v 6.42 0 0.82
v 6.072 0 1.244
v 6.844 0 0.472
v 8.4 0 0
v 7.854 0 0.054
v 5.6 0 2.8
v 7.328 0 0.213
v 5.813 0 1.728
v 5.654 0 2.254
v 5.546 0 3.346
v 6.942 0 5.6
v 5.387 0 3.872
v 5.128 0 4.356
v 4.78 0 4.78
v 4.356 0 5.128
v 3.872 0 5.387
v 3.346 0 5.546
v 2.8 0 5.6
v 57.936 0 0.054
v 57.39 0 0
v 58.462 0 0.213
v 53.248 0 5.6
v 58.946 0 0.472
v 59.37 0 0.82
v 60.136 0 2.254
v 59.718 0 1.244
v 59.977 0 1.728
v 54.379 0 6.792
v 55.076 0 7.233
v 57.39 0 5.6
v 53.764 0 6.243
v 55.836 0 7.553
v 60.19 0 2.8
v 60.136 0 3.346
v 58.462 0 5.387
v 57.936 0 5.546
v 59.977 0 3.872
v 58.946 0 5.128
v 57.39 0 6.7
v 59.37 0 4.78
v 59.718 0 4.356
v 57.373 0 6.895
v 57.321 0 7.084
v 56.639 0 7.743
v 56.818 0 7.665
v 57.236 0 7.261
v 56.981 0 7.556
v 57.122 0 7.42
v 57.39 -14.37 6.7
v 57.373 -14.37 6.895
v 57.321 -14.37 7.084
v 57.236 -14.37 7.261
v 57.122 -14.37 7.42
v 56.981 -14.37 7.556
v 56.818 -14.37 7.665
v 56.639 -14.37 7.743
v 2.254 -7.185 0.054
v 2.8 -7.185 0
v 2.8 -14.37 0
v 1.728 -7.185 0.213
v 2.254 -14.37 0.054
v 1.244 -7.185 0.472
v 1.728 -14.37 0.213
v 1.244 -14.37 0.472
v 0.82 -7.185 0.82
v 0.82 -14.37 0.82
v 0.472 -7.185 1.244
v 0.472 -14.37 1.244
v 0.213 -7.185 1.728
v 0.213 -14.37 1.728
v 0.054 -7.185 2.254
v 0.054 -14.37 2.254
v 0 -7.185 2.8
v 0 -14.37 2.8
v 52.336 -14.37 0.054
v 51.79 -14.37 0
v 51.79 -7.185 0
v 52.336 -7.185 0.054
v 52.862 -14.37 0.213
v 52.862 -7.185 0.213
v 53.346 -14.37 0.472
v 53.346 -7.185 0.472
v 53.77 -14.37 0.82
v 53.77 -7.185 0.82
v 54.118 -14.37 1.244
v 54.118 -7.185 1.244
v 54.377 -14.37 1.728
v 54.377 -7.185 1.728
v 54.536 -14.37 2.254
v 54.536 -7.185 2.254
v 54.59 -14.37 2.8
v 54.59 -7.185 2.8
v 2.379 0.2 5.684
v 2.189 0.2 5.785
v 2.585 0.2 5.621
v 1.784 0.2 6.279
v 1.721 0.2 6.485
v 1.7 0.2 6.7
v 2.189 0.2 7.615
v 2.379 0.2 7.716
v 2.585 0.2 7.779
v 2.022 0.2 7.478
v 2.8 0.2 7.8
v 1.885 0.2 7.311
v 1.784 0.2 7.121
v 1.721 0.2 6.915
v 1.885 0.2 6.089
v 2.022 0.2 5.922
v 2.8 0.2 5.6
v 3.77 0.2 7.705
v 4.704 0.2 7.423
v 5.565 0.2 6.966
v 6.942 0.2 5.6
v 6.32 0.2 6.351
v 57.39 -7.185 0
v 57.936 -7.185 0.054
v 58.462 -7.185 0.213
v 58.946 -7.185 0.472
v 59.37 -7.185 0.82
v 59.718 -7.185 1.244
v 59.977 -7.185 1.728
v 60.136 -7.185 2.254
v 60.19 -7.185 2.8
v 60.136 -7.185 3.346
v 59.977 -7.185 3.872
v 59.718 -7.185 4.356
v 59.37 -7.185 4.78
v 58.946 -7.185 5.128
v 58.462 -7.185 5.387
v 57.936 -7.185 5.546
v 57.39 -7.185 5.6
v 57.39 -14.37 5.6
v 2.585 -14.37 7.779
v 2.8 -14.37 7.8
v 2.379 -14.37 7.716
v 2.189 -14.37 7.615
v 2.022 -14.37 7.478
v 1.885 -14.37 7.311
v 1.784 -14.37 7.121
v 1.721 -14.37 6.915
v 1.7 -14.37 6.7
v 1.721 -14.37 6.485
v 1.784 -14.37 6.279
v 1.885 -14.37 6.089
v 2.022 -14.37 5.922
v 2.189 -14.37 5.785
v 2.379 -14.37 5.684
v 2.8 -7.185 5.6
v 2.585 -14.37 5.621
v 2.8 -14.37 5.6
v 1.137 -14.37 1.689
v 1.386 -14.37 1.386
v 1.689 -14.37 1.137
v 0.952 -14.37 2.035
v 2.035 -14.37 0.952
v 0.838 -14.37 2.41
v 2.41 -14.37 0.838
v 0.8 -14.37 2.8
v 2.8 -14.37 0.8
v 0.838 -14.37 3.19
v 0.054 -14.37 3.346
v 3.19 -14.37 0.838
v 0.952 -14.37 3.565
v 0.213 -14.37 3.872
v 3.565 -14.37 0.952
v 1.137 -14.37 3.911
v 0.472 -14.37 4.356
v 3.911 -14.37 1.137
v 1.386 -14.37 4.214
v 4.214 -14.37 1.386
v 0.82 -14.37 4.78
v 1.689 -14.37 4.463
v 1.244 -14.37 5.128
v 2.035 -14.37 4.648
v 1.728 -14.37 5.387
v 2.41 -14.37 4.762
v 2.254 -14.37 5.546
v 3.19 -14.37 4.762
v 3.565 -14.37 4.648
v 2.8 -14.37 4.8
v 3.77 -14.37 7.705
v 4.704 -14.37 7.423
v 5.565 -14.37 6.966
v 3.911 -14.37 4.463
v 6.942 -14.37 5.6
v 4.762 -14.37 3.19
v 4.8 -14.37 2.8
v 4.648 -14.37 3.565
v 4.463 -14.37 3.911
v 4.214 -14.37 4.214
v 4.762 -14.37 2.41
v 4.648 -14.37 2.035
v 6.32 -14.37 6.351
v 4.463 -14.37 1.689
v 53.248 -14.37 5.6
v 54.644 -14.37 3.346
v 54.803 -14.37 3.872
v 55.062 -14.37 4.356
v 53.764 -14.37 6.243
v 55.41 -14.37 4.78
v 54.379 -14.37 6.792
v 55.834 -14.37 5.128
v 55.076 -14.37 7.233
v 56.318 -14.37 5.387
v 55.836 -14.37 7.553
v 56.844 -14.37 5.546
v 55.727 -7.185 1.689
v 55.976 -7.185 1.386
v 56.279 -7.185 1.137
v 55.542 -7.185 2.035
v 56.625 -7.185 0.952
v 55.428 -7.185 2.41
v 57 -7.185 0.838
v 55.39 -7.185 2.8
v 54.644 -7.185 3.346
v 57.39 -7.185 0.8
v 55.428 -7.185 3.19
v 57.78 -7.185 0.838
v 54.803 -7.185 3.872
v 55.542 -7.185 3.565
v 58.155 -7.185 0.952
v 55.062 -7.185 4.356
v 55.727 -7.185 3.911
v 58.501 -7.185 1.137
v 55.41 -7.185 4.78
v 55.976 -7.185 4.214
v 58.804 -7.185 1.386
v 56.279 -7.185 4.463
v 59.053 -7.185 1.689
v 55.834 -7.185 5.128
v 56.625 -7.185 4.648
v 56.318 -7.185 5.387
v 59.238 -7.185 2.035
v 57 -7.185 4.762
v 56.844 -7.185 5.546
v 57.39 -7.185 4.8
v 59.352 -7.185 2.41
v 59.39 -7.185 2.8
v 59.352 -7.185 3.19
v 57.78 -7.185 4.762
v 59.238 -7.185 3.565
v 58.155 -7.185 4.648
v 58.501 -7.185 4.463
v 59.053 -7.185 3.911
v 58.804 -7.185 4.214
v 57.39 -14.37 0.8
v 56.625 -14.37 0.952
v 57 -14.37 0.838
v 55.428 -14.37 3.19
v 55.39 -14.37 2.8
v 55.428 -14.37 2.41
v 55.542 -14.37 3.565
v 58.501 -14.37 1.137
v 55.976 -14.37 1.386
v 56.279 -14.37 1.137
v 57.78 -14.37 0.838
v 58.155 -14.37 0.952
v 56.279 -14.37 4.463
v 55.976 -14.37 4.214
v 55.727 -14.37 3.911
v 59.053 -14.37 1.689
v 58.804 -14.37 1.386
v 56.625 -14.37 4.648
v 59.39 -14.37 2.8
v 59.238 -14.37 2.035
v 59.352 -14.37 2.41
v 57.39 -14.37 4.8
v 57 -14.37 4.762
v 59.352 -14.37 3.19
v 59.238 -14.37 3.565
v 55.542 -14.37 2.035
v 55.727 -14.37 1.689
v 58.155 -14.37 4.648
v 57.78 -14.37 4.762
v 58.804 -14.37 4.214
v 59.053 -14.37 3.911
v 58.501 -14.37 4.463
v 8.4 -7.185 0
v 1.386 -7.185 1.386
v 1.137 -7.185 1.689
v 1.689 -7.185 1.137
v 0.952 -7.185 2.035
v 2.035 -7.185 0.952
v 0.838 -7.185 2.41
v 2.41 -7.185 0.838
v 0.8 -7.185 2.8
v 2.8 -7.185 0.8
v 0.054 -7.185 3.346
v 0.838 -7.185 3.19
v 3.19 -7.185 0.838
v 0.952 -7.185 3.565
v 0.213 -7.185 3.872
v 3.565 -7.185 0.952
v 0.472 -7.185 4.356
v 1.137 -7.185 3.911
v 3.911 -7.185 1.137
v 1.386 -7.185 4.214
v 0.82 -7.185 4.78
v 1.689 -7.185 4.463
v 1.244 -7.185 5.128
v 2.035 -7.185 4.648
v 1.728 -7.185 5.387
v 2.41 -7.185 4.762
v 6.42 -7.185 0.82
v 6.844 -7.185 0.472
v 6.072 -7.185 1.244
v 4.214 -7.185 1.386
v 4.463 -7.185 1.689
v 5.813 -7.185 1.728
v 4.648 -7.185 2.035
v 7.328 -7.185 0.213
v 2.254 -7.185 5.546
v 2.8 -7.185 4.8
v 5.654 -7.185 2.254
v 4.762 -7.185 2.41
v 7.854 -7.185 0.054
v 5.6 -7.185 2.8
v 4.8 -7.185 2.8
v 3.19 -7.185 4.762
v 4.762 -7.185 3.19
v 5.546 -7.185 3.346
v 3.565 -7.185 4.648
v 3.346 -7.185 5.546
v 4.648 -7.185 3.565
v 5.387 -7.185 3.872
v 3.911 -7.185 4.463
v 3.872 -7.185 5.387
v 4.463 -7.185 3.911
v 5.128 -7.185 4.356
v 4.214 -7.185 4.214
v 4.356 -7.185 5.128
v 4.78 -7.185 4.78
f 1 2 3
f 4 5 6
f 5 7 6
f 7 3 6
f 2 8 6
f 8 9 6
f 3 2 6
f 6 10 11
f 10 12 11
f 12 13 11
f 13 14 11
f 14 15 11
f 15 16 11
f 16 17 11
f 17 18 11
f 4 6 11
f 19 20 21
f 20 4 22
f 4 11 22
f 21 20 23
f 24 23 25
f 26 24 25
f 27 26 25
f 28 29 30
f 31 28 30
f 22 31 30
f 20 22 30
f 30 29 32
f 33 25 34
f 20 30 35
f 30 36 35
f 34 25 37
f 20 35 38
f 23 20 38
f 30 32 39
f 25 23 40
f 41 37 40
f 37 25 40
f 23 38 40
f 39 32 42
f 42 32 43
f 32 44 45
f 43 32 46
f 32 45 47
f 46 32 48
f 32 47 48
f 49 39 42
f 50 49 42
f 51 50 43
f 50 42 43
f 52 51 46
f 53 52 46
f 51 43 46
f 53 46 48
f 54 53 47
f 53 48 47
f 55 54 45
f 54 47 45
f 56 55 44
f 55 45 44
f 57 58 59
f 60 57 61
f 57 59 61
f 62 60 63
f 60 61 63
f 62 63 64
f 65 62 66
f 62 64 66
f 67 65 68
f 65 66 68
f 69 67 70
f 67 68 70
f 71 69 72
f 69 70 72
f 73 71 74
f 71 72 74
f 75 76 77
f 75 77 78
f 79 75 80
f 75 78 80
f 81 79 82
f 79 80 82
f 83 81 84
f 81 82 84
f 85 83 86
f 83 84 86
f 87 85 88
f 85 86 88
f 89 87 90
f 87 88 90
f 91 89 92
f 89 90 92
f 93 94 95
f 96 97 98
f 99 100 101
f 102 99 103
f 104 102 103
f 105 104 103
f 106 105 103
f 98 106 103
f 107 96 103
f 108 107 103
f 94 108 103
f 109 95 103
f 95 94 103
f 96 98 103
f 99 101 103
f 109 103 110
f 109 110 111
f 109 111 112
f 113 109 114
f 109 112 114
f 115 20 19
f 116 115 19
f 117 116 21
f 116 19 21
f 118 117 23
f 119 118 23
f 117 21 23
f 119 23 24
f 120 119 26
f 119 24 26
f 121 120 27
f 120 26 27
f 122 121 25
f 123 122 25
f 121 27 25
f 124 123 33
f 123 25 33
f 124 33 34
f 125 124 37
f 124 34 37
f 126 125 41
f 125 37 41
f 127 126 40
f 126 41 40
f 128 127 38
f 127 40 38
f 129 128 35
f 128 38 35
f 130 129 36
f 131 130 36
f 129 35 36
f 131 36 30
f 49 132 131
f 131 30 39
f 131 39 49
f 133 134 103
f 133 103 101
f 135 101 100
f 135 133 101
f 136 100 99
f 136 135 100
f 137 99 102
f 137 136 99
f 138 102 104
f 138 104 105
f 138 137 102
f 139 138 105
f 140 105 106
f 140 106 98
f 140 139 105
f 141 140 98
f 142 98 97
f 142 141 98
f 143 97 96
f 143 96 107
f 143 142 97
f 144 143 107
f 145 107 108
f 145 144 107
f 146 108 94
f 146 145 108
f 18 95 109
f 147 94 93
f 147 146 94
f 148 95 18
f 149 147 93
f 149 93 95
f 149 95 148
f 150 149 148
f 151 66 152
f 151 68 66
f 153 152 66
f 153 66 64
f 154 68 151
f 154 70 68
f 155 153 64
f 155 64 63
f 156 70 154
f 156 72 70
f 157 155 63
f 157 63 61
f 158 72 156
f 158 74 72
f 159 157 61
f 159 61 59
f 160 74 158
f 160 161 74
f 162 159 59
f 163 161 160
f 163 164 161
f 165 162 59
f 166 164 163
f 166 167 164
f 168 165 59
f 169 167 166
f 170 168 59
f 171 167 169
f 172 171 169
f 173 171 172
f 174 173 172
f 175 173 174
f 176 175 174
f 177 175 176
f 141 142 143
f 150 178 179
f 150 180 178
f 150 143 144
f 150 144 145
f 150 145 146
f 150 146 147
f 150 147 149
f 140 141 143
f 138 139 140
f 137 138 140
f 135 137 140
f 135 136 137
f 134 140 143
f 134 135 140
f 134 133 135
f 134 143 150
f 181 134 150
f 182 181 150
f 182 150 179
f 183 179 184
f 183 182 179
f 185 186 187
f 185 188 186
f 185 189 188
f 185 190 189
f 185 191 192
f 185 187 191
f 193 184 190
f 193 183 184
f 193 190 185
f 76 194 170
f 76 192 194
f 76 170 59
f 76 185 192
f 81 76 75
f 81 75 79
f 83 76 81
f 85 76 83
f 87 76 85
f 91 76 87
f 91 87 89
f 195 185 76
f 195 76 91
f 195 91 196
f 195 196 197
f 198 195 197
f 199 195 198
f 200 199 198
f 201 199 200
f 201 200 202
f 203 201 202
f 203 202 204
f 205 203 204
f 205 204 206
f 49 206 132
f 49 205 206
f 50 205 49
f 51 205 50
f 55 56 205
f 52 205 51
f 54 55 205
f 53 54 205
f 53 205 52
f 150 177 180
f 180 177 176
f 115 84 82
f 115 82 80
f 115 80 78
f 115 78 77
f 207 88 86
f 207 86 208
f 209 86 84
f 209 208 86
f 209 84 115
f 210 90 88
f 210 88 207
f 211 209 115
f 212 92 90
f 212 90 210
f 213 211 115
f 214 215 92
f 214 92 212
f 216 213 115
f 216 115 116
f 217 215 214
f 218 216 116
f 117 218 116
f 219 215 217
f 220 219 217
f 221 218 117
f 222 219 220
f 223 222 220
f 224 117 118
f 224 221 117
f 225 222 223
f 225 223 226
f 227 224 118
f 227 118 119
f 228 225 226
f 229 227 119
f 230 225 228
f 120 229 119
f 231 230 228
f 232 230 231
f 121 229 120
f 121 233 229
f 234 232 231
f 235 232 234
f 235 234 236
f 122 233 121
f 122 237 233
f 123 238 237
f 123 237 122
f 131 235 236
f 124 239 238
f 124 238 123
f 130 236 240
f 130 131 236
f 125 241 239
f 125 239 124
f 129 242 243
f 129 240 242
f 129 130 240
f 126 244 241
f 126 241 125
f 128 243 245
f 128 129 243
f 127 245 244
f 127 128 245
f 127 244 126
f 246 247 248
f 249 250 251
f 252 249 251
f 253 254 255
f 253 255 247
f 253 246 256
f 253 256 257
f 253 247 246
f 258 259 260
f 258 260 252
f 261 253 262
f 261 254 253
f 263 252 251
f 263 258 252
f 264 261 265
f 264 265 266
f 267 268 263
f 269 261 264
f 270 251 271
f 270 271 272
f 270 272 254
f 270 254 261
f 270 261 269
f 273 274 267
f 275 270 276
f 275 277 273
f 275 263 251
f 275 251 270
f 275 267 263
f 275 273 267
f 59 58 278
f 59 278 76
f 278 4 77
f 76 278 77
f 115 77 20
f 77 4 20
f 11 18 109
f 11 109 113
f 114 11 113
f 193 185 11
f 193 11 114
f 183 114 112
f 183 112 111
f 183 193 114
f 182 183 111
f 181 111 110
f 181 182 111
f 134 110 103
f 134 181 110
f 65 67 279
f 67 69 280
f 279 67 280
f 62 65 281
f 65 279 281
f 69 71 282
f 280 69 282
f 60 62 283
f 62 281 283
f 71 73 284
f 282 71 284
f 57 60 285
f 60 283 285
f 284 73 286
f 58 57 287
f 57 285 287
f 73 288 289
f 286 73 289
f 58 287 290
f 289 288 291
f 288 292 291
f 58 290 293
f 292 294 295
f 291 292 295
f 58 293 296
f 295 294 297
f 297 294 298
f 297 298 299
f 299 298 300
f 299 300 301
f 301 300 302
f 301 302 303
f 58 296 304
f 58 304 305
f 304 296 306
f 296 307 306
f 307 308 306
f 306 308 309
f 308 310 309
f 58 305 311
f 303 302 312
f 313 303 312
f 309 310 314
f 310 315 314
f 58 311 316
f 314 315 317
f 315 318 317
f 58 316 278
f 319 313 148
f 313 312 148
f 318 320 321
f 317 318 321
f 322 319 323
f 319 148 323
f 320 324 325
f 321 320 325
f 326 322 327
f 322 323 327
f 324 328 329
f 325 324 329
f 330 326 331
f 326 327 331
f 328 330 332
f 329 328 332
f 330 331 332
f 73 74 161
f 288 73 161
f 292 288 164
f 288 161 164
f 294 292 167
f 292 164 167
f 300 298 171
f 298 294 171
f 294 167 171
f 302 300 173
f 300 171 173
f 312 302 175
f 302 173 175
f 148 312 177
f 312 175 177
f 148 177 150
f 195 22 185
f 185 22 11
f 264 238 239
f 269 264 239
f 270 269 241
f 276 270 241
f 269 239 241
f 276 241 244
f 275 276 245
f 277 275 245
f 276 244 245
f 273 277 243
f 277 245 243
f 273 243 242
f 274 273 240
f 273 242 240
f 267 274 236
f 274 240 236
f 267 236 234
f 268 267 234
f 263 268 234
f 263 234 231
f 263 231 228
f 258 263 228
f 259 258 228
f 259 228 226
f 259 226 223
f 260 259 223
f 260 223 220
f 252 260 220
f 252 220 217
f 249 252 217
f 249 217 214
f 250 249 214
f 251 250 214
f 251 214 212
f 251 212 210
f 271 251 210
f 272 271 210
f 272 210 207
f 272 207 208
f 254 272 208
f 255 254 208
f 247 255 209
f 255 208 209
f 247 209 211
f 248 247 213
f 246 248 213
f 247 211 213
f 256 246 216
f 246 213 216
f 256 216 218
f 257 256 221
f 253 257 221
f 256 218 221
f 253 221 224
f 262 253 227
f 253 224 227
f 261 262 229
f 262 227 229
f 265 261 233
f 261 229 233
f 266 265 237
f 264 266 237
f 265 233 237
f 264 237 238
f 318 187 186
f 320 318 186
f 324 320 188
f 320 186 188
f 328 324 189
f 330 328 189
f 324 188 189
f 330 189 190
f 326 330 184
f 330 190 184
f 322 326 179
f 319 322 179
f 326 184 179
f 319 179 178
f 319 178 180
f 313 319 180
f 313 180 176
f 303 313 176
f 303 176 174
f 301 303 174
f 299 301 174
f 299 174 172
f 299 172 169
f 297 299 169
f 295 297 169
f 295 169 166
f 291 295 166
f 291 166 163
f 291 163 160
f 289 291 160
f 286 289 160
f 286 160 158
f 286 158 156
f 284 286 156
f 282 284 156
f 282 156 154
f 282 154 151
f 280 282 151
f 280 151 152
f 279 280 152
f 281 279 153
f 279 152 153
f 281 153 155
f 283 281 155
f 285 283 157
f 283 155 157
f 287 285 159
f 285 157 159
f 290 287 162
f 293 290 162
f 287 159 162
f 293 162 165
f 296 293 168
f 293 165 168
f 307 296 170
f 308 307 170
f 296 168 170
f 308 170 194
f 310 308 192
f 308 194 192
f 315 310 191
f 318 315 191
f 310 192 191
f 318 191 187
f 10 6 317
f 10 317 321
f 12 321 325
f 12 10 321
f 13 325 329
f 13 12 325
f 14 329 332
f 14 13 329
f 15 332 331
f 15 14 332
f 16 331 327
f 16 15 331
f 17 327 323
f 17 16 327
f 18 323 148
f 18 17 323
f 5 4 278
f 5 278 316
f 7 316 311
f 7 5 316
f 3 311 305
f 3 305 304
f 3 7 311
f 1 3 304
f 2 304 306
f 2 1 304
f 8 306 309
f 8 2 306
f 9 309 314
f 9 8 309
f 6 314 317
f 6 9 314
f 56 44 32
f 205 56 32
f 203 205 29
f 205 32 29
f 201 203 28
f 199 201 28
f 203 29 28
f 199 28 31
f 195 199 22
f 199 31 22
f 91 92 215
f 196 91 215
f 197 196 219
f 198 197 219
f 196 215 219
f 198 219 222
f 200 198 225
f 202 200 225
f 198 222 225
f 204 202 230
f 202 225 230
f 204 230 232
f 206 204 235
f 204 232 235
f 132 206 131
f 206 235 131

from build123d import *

# Parameters (mm, degrees)
F1_DEPTH = 14.37
F0_R     = 2
F2_DEPTH = 7.185
F4_DEPTH = 14.57
F3_R     = 2
F5_DEPTH = 14.37
F7_DEPTH = 7.185


with BuildPart() as f1:
    # F0 (on Front) → F1 (new body)
    with BuildSketch(Plane.XZ):
        with BuildLine():
            Line((0, 5.6), (0, 0))
            Line((0, 0), (51.79, 0))
            ThreePointArc((51.79, 0), (53.7698989873, 0.8201010127), (54.59, 2.8))
            ThreePointArc((54.59, 2.8), (55.4101010127, 4.7798989873), (57.39, 5.6))
            Line((57.39, 5.6), (57.39, 6.7))
            ThreePointArc((57.39, 6.7), (57.1826506427, 7.3427867688), (56.6387730361, 7.7432436768))
            ThreePointArc((56.6387730361, 7.7432436768), (54.7187785908, 7.0266507051), (53.2475369646, 5.6))
            Line((53.2475369646, 5.6), (0, 5.6))
        make_face()
    extrude(amount=F1_DEPTH)



with BuildPart() as f1b:
    # F0 (on Front) → F1, piece 2 (new body)
    with BuildSketch(Plane.XZ):
        with Locations((57.39, 2.8)):
            Circle(F0_R)
    extrude(amount=F1_DEPTH)


with BuildPart() as f1_1:
    add(f1.part)

    add(f1b.part)  # F2 merges F1b
    # F0 (on Front) → F2 (join)
    with BuildSketch(Plane.XZ):
        with BuildLine():
            ThreePointArc((54.59, 2.8), (53.7698989873, 0.8201010127), (51.79, 0))
            Line((51.79, 0), (57.39, 0))
            ThreePointArc((57.39, 0), (60.19, 2.8), (57.39, 5.6))
            ThreePointArc((57.39, 5.6), (55.4101010127, 4.7798989873), (54.59, 2.8))
        make_face()
        with Locations((57.39, 2.8)):
            Circle(F0_R, mode=Mode.SUBTRACT)
    extrude(amount=F2_DEPTH)

    # F3 (on face) → F4 (join)
    with BuildSketch(Plane.XZ.offset(14.37)):
        with BuildLine():
            ThreePointArc((2.8, 7.8), (1.7, 6.6999999984), (2.8000000032, 5.6))
            ThreePointArc((2.8000000032, 5.6), (3.5778174604, 5.9221825418), (3.9, 6.7))
            ThreePointArc((3.9, 6.7), (3.5778174593, 7.4778174593), (2.8, 7.8))
        make_face()
        with BuildLine():
            ThreePointArc((3.9, 6.7), (3.5778174604, 5.9221825418), (2.8000000032, 5.6))
            Line((2.8000000032, 5.6), (6.9424630354, 5.6))
            ThreePointArc((6.9424630354, 5.6), (5.1452078799, 7.2158804332), (2.8, 7.8))
            ThreePointArc((2.8, 7.8), (3.5778174593, 7.4778174593), (3.9, 6.7))
        make_face()
    extrude(amount=-F4_DEPTH)

    # F3 (on face) → F5 (cut)
    with BuildSketch(Plane.XZ.offset(14.37)):
        with BuildLine():
            ThreePointArc((0, 2.8), (0.8201010138, 4.7798989885), (2.8000000032, 5.6))
            Line((2.8000000032, 5.6), (0, 5.6))
            Line((0, 5.6), (0, 2.8))
        make_face()
        with BuildLine():
            Line((0, 0), (2.8, 0))
            ThreePointArc((2.8, 0), (0.8201010127, 0.8201010127), (0, 2.8))
            Line((0, 2.8), (0, 0))
        make_face()
        with Locations((2.8, 2.8)):
            Circle(F3_R)
    extrude(amount=-F5_DEPTH, mode=Mode.SUBTRACT)

    # F6 (on face) → F7 (cut)
    with BuildSketch(Plane.XZ):
        with BuildLine():
            Line((5.6, 0), (5.6, 2.8))
            ThreePointArc((5.6, 2.8), (0.8201010127, 4.7798989873), (2.8, 0))
            Line((2.8, 0), (5.6, 0))
        make_face()
        with BuildLine():
            ThreePointArc((8.4, 0), (6.4201010127, 0.8201010127), (5.6, 2.8))
            Line((5.6, 2.8), (5.6, 0))
            Line((5.6, 0), (8.4, 0))
        make_face()
    extrude(amount=F7_DEPTH, mode=Mode.SUBTRACT)


solid = f1_1.part
